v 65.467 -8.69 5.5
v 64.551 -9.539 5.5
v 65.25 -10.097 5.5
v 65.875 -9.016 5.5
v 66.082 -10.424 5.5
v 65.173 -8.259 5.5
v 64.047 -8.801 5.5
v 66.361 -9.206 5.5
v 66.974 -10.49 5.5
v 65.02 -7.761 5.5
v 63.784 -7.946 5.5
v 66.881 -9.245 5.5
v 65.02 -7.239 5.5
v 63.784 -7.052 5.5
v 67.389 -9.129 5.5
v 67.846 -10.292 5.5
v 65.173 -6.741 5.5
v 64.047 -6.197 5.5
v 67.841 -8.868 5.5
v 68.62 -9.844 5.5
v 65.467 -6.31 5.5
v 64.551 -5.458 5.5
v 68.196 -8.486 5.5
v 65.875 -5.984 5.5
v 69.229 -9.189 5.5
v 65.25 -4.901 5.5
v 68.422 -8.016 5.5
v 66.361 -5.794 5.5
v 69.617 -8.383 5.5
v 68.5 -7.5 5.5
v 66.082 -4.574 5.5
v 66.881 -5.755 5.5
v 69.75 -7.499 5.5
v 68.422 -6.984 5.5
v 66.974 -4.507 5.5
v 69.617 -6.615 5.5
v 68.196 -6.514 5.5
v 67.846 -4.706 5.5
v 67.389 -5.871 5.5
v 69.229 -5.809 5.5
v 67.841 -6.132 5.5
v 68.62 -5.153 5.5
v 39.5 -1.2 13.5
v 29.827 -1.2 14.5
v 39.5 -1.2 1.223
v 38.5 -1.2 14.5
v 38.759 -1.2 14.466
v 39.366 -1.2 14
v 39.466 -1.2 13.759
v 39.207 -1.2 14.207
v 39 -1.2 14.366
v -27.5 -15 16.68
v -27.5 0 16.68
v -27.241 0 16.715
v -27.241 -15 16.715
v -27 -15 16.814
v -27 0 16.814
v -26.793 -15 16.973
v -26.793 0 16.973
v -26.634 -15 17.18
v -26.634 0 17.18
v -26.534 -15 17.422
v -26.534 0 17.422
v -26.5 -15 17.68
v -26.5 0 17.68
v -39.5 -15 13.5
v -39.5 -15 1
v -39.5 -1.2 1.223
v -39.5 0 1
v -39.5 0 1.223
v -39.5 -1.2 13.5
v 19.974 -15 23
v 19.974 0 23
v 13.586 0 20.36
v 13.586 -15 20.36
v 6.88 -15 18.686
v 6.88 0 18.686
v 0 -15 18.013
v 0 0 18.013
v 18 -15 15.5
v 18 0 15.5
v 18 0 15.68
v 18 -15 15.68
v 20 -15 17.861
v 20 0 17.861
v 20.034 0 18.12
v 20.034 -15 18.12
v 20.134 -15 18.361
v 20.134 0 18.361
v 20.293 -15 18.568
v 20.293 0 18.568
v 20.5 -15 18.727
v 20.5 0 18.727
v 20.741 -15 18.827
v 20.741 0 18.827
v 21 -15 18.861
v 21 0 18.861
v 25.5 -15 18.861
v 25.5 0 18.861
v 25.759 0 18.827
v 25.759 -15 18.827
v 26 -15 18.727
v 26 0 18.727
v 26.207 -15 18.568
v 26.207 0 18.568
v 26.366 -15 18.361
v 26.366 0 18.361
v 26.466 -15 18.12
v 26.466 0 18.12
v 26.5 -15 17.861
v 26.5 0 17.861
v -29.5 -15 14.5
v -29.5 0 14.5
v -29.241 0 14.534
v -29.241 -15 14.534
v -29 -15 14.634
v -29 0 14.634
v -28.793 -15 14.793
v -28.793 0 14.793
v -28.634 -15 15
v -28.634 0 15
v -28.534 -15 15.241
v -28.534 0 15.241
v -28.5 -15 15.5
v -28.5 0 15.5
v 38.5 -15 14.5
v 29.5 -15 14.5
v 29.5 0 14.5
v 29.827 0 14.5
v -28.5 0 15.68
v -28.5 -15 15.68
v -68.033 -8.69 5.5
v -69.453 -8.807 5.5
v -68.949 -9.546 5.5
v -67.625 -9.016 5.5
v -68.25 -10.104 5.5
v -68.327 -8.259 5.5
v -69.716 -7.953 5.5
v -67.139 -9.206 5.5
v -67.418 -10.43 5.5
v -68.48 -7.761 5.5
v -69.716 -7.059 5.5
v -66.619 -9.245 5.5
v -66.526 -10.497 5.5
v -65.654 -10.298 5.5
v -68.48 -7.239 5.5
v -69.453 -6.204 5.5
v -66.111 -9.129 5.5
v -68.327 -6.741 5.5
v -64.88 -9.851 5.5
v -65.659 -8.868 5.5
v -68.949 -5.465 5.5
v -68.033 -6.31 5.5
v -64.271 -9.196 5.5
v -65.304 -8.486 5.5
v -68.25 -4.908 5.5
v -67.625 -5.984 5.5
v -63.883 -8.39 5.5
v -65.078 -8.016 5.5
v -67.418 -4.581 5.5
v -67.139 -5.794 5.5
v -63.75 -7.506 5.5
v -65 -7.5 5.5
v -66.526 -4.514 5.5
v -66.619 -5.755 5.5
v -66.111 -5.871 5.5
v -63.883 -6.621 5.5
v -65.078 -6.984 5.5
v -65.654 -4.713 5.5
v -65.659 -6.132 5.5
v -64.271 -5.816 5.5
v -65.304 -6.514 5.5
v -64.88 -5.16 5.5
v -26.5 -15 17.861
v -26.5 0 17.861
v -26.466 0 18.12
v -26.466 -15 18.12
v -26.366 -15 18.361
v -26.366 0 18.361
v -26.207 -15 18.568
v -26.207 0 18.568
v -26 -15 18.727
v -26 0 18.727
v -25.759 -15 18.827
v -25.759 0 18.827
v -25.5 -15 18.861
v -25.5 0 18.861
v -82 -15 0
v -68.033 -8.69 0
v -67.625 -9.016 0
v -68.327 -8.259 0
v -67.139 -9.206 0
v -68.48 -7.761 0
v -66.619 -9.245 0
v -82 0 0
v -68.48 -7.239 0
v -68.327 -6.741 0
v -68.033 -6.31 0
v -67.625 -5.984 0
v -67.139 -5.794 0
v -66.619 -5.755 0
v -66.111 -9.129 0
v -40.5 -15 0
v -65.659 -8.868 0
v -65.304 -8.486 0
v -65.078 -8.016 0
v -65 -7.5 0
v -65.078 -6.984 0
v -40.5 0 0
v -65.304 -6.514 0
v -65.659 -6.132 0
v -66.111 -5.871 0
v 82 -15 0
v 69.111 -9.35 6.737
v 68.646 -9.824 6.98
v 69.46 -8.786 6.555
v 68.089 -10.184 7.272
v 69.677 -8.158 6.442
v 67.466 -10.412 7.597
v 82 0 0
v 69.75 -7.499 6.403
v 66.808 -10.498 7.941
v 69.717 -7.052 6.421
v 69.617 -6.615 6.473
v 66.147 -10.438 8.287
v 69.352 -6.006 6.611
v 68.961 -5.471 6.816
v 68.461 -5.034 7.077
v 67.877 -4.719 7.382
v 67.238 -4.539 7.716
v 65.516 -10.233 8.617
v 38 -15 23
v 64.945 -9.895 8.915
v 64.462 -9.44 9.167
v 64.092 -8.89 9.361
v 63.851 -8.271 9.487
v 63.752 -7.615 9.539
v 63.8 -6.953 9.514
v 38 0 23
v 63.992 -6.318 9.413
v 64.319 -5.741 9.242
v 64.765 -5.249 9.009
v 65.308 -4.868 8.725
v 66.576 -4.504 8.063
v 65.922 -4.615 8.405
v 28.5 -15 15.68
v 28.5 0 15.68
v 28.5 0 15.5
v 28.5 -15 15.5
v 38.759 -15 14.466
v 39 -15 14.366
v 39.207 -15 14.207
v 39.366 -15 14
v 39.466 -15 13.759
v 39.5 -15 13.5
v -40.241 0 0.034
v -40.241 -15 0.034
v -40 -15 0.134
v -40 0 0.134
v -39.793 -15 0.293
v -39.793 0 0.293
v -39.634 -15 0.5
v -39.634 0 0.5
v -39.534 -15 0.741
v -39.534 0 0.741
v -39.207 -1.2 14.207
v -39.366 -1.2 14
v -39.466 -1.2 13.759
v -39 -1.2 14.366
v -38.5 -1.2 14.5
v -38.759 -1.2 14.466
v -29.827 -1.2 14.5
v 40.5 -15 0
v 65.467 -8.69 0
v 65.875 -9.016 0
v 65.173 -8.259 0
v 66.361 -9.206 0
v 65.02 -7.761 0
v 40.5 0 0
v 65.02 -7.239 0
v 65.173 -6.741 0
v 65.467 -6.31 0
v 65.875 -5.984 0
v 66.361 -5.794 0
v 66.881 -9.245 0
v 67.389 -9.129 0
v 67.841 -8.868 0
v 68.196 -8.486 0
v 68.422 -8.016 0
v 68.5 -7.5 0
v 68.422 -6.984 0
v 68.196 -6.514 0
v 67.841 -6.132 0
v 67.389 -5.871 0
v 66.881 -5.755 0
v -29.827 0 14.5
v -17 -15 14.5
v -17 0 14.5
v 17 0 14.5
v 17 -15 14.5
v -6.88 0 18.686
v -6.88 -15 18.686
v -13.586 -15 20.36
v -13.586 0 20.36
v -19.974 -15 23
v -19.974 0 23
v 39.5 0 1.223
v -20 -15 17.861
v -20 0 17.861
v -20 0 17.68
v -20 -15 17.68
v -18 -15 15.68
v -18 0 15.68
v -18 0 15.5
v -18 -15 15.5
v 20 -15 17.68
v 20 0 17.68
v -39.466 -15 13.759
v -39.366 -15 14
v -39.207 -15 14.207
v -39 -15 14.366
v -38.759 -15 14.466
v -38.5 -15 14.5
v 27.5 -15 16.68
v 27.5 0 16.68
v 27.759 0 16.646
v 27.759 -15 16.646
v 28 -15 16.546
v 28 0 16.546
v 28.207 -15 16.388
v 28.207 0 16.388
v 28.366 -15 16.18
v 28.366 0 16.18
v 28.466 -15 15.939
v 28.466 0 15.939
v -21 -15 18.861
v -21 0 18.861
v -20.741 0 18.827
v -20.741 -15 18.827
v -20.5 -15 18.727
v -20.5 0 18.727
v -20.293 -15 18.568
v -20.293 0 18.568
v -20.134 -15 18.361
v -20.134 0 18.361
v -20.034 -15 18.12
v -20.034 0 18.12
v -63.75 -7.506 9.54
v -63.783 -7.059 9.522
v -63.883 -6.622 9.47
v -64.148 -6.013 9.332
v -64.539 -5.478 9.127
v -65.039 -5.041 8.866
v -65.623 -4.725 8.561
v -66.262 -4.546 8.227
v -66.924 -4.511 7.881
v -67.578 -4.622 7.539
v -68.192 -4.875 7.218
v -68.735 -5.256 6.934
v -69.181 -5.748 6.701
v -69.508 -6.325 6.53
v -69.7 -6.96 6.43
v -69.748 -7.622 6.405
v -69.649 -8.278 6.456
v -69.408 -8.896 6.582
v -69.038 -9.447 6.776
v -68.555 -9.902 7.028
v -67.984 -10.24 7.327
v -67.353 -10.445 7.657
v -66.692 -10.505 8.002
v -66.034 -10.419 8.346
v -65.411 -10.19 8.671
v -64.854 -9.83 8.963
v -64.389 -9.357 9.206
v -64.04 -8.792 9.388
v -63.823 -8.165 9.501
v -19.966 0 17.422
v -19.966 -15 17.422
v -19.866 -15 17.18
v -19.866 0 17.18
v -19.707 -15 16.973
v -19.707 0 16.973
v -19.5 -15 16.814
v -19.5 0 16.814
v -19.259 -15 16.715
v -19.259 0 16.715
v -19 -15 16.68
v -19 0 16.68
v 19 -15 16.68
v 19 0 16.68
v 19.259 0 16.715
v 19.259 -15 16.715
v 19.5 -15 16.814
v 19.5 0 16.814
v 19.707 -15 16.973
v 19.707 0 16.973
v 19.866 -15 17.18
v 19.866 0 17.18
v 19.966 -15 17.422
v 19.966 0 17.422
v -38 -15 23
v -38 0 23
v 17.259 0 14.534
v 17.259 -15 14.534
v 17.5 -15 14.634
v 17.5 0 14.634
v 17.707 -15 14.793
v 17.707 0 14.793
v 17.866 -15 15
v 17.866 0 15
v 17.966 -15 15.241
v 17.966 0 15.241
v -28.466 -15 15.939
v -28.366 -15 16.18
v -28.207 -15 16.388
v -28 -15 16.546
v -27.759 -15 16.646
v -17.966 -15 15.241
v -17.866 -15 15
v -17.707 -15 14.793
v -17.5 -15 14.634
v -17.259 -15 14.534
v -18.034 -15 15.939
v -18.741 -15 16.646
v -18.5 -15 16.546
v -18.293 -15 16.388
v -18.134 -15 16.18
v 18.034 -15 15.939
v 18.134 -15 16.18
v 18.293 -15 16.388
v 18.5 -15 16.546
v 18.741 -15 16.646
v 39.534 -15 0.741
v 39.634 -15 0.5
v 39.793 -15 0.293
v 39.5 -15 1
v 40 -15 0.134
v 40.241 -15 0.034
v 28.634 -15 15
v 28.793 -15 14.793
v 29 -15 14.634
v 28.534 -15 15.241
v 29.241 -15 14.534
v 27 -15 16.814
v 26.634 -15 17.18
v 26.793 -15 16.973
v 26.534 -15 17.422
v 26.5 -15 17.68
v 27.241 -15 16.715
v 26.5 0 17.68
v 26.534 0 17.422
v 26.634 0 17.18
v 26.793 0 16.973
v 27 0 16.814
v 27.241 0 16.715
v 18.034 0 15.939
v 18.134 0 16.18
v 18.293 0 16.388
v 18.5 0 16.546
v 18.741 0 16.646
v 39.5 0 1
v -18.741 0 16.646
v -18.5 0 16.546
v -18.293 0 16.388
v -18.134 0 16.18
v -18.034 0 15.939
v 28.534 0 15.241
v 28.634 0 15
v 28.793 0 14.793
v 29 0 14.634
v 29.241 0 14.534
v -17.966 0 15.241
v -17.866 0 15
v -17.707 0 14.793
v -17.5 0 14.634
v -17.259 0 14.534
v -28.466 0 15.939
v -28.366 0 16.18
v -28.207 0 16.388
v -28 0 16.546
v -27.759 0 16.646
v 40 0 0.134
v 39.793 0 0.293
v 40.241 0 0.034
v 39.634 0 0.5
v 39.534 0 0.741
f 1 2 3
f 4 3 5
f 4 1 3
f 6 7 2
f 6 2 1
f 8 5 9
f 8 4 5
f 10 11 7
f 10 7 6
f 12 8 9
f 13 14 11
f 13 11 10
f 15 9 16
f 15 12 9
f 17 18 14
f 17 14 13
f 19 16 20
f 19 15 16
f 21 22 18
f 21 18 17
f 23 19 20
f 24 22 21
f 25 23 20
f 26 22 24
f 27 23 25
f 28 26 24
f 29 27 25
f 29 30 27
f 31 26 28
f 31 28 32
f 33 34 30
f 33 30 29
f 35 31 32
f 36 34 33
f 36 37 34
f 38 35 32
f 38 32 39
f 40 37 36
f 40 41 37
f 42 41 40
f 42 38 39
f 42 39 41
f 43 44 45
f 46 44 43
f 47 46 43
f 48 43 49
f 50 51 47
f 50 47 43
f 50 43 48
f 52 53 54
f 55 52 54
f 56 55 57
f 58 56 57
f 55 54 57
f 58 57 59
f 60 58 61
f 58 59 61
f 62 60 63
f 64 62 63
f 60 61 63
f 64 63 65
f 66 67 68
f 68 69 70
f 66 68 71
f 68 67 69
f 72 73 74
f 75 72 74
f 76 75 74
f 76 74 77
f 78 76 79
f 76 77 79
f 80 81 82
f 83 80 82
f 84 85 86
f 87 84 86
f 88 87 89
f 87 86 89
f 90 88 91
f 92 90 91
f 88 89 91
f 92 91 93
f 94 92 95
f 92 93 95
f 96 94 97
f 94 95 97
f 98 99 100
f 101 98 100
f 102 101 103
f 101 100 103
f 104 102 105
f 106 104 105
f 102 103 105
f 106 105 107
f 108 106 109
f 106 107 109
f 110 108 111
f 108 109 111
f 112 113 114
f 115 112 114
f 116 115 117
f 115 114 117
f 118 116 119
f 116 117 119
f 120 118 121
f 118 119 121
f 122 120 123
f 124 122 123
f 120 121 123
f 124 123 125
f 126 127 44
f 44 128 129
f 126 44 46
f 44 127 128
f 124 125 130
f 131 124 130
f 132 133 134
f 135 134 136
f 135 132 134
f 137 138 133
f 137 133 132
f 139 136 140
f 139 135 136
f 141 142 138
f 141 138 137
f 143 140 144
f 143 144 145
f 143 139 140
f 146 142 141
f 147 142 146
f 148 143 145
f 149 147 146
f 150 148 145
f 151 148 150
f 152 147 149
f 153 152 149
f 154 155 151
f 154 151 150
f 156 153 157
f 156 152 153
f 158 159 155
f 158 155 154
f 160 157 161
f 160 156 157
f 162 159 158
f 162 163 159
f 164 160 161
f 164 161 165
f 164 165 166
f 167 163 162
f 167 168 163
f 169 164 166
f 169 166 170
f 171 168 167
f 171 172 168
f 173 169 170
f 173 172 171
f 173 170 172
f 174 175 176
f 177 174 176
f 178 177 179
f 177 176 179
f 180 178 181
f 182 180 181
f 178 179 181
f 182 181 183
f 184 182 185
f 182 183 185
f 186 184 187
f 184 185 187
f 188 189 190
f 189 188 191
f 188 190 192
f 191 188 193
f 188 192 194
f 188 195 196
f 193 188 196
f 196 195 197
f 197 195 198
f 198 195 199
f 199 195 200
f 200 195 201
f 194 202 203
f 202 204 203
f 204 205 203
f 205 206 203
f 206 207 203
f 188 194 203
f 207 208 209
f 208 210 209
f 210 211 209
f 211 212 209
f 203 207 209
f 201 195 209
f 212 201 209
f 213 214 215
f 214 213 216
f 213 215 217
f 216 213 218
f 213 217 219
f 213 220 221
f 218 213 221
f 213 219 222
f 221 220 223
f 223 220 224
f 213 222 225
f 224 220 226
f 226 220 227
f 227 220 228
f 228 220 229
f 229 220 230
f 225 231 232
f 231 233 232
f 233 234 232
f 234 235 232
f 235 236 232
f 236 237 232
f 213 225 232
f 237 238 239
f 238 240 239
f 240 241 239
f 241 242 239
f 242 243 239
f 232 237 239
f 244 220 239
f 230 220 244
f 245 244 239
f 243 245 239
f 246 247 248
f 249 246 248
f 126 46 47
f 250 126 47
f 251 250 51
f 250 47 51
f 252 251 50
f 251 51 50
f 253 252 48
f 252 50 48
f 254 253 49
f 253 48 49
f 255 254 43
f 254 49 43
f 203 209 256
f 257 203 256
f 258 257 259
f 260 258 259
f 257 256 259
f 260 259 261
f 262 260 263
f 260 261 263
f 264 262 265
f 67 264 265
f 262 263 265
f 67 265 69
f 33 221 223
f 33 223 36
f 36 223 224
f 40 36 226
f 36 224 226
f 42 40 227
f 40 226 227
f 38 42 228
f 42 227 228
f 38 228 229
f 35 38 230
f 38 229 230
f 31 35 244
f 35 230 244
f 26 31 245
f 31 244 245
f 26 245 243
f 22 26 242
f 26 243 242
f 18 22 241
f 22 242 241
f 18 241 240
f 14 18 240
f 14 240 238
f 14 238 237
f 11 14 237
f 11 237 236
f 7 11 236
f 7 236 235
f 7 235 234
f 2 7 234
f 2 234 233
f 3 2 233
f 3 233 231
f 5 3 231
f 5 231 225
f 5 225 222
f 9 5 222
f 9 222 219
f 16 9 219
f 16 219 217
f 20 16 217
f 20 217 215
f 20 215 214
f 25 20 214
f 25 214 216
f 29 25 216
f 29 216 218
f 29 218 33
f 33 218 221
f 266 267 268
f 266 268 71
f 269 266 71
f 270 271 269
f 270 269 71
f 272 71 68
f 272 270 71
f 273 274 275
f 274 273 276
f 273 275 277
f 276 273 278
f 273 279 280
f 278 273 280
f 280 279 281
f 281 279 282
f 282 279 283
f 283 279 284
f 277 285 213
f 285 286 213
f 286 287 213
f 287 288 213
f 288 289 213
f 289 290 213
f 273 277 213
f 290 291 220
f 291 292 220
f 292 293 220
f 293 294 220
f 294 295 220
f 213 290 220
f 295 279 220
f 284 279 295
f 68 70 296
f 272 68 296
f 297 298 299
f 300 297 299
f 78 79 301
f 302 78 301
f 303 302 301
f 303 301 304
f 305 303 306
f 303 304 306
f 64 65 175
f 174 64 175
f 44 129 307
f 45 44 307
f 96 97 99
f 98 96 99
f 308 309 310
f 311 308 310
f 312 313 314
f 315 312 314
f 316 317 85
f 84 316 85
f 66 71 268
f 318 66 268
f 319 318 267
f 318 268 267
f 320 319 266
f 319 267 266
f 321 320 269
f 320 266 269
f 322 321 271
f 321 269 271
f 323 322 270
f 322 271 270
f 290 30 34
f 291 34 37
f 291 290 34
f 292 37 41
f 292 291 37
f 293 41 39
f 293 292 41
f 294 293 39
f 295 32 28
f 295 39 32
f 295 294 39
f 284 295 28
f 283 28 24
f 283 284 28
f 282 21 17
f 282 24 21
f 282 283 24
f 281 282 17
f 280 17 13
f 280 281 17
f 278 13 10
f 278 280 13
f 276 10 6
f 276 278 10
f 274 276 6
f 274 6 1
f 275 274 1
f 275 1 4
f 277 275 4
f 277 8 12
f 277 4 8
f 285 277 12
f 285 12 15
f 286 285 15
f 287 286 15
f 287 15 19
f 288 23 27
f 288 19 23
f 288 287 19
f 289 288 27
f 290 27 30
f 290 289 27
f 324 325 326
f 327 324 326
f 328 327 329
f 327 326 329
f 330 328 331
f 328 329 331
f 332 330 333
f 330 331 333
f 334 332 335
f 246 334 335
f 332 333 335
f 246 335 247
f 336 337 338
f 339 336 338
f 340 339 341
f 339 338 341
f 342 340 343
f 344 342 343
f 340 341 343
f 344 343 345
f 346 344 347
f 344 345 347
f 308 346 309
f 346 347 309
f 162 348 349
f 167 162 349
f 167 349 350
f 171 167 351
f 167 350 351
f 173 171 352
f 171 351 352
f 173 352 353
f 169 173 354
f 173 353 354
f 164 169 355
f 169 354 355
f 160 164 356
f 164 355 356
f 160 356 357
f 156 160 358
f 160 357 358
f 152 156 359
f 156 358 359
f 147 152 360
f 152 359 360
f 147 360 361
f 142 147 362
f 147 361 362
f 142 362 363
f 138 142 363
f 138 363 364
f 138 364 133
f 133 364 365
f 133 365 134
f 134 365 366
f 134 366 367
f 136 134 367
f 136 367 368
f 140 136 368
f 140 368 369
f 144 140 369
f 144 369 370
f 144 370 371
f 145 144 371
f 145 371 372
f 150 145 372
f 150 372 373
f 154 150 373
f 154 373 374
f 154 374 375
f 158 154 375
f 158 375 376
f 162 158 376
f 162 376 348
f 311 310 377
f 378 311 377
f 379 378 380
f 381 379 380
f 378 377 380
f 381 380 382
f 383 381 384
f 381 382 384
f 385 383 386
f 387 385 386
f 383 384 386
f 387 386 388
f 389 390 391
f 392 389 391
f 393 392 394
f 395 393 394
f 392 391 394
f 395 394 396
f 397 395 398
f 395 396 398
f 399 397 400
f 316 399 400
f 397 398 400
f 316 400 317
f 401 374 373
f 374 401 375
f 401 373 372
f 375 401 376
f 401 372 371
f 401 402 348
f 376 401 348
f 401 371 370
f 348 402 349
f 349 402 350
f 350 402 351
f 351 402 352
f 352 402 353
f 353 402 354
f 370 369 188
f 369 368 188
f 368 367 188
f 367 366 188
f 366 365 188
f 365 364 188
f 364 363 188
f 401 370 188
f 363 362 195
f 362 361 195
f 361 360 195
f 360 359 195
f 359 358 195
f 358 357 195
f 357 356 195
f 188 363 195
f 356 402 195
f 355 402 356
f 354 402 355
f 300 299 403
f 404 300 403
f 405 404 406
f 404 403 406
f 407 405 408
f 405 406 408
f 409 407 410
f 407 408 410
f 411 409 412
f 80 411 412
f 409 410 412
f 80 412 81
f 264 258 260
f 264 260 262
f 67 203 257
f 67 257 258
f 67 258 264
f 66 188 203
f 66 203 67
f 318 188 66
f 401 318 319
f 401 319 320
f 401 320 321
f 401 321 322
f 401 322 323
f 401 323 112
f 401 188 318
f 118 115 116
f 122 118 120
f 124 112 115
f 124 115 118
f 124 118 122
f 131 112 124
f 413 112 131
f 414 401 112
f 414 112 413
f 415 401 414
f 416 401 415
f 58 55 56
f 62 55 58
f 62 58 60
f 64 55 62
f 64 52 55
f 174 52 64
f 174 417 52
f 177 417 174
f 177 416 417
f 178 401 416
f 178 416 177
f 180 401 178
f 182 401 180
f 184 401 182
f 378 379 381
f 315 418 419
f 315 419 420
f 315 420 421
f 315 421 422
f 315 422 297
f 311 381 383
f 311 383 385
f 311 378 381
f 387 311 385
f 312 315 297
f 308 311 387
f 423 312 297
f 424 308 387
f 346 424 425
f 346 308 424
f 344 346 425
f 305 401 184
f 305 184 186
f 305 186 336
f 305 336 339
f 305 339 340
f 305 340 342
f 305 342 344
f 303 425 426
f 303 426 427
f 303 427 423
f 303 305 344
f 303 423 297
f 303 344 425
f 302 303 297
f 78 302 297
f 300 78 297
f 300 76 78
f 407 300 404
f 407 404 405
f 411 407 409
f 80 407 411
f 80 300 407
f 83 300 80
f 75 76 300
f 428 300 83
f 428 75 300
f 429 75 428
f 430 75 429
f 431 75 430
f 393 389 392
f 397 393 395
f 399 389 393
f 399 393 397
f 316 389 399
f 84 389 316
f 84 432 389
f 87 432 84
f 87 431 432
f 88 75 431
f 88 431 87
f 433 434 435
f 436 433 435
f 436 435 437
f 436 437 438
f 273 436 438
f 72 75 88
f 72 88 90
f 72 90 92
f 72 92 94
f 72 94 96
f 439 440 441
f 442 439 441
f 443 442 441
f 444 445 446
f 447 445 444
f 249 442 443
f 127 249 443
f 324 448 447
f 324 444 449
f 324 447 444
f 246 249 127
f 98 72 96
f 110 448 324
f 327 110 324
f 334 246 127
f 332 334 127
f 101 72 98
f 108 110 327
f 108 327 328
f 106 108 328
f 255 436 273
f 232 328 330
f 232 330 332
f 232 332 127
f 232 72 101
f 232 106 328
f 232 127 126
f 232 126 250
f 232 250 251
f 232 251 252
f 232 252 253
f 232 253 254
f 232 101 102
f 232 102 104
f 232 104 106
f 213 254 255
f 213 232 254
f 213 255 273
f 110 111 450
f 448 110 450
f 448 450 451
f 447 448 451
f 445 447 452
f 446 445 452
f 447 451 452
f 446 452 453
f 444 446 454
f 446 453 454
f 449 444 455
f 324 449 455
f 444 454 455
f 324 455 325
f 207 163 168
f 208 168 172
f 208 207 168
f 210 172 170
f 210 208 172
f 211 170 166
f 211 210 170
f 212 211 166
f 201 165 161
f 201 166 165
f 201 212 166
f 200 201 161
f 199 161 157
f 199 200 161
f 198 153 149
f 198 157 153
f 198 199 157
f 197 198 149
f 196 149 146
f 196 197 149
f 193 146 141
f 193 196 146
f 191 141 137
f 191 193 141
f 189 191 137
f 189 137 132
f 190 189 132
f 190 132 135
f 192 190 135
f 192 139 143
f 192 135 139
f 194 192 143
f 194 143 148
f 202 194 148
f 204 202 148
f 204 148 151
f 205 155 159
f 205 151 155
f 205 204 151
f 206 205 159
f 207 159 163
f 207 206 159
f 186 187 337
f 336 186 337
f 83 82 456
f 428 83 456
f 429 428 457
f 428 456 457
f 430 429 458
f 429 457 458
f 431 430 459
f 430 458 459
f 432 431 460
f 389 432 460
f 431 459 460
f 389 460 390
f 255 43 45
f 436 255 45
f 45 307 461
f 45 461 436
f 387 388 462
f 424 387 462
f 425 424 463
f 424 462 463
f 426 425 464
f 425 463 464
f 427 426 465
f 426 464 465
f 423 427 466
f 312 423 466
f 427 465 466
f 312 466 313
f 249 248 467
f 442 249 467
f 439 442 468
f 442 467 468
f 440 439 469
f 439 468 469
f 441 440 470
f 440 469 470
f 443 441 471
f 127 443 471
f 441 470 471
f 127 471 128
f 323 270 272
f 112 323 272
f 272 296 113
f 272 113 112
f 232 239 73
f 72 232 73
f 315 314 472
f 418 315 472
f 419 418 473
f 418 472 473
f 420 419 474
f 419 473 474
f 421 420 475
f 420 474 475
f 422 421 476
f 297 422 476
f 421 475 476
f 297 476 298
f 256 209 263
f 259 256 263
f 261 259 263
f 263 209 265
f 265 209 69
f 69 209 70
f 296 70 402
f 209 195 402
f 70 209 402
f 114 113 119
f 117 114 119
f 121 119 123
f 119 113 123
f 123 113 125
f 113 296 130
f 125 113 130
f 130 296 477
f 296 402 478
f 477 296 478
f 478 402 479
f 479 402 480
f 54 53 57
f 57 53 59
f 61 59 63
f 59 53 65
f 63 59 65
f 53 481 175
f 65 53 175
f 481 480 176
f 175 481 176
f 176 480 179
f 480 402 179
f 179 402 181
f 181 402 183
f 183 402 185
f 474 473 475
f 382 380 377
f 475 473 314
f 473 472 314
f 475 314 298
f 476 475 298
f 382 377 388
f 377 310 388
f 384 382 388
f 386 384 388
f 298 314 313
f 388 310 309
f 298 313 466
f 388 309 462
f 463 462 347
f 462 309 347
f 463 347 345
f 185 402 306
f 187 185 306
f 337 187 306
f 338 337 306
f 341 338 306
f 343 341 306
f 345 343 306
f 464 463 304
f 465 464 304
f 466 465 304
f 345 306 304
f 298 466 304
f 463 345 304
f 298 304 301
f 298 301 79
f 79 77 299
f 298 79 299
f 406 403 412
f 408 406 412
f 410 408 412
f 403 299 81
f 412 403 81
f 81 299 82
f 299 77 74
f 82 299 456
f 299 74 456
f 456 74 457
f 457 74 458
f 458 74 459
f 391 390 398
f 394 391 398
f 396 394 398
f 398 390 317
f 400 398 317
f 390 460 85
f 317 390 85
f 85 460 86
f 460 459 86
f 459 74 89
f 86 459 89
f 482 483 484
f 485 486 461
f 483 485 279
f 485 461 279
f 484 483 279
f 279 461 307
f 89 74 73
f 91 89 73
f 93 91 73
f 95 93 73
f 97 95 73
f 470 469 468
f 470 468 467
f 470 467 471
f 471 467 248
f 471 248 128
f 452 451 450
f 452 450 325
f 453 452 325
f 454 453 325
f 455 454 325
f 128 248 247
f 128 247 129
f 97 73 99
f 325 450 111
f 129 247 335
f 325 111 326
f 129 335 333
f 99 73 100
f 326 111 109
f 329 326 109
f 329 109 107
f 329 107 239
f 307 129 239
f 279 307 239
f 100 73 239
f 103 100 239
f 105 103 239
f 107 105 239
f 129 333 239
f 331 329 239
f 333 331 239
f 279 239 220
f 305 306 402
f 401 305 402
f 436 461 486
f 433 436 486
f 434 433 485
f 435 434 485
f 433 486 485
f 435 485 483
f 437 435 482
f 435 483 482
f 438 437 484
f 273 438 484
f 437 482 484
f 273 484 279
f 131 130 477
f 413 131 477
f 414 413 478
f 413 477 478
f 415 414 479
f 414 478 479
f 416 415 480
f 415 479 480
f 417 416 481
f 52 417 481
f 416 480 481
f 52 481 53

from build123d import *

# Parameters (mm, degrees)
F2_DEPTH = 15
F3_R     = 1.75
F4_DEPTH = 23.001
F5_R     = 3
F6_DEPTH = 4.5
F8_DEPTH = 1.2


with BuildPart() as f2:
    # F1 (on Front) → F2 (new body)
    with BuildSketch(Plane.XZ):
        with BuildLine():
            Line((-82, 0), (-40.5, 0))
            ThreePointArc((-40.5, 0), (-39.792893, 0.292893), (-39.5, 1))
            Line((-39.5, 1), (-39.5, 13.5))
            ThreePointArc((-39.5, 13.5), (-39.207107, 14.207107), (-38.5, 14.5))
            Line((-38.5, 14.5), (-29.5, 14.5))
            ThreePointArc((-29.5, 14.5), (-28.792893, 14.792893), (-28.5, 15.5))
            Line((-28.5, 15.5), (-28.5, 15.68045))
            ThreePointArc((-28.5, 15.68045), (-28.207107, 16.387557), (-27.5, 16.68045))
            ThreePointArc((-27.5, 16.68045), (-26.792893, 16.973344), (-26.5, 17.68045))
            Line((-26.5, 17.68045), (-26.5, 17.860901))
            ThreePointArc((-26.5, 17.860901), (-26.207107, 18.568008), (-25.5, 18.860901))
            Line((-25.5, 18.860901), (-21, 18.860901))
            ThreePointArc((-21, 18.860901), (-20.292893, 18.568008), (-20, 17.860901))
            Line((-20, 17.860901), (-20, 17.68045))
            ThreePointArc((-20, 17.68045), (-19.707107, 16.973344), (-19, 16.68045))
            ThreePointArc((-19, 16.68045), (-18.292893, 16.387557), (-18, 15.68045))
            Line((-18, 15.68045), (-18, 15.5))
            ThreePointArc((-18, 15.5), (-17.707107, 14.792893), (-17, 14.5))
            Line((-17, 14.5), (0, 14.5))
            Line((0, 14.5), (17, 14.5))
            ThreePointArc((17, 14.5), (17.707107, 14.792893), (18, 15.5))
            Line((18, 15.5), (18, 15.68045))
            ThreePointArc((18, 15.68045), (18.292893, 16.387557), (19, 16.68045))
            ThreePointArc((19, 16.68045), (19.707107, 16.973344), (20, 17.68045))
            Line((20, 17.68045), (20, 17.860901))
            ThreePointArc((20, 17.860901), (20.292893, 18.568008), (21, 18.860901))
            Line((21, 18.860901), (25.5, 18.860901))
            ThreePointArc((25.5, 18.860901), (26.207107, 18.568008), (26.5, 17.860901))
            Line((26.5, 17.860901), (26.5, 17.68045))
            ThreePointArc((26.5, 17.68045), (26.792893, 16.973344), (27.5, 16.68045))
            ThreePointArc((27.5, 16.68045), (28.207107, 16.387557), (28.5, 15.68045))
            Line((28.5, 15.68045), (28.5, 15.5))
            ThreePointArc((28.5, 15.5), (28.792893, 14.792893), (29.5, 14.5))
            Line((29.5, 14.5), (38.5, 14.5))
            ThreePointArc((38.5, 14.5), (39.207107, 14.207107), (39.5, 13.5))
            Line((39.5, 13.5), (39.5, 1))
            ThreePointArc((39.5, 1), (39.792893, 0.292893), (40.5, 0))
            Line((40.5, 0), (82, 0))
            Line((82, 0), (38, 23))
            Line((38, 23), (19.974391, 23))
            ThreePointArc((19.974391, 23), (10.263617, 19.399316), (0, 18.012873))
            ThreePointArc((0, 18.012873), (-10.263617, 19.399316), (-19.974391, 23))
            Line((-19.974391, 23), (-38, 23))
            Line((-38, 23), (-82, 0))
        make_face()
    extrude(amount=F2_DEPTH)

    # F3 (on Top) → F4 (cut, through all)
    with BuildSketch(Plane.XY):
        with Locations((66.75, -7.5)):
            Circle(F3_R)
        with Locations((-66.75, -7.5)):
            Circle(F3_R)
    extrude(amount=F4_DEPTH, mode=Mode.SUBTRACT)

    # F5 (on offset) → F6 (cut)
    with BuildSketch(Plane.XY.offset(10)):
        with Locations((-66.75, -7.505668)):
            Circle(F5_R)
        with Locations((66.75, -7.498881)):
            Circle(F5_R)
    extrude(amount=-F6_DEPTH, mode=Mode.SUBTRACT)

    # F7 (on Front) → F8 (join)
    with BuildSketch(Plane.XZ):
        with BuildLine():
            Line((-39.5, 13.5), (-39.5, 1.22279))
            Line((-39.5, 1.22279), (-29.826649, 14.5))
            Line((-29.826649, 14.5), (-38.5, 14.5))
            ThreePointArc((-38.5, 14.5), (-39.207107, 14.207107), (-39.5, 13.5))
        make_face()
        with BuildLine():
            Line((29.826649, 14.5), (39.5, 1.22279))
            Line((39.5, 1.22279), (39.5, 13.5))
            ThreePointArc((39.5, 13.5), (39.207107, 14.207107), (38.5, 14.5))
            Line((38.5, 14.5), (29.826649, 14.5))
        make_face()
    extrude(amount=F8_DEPTH)


solid = f2.part
